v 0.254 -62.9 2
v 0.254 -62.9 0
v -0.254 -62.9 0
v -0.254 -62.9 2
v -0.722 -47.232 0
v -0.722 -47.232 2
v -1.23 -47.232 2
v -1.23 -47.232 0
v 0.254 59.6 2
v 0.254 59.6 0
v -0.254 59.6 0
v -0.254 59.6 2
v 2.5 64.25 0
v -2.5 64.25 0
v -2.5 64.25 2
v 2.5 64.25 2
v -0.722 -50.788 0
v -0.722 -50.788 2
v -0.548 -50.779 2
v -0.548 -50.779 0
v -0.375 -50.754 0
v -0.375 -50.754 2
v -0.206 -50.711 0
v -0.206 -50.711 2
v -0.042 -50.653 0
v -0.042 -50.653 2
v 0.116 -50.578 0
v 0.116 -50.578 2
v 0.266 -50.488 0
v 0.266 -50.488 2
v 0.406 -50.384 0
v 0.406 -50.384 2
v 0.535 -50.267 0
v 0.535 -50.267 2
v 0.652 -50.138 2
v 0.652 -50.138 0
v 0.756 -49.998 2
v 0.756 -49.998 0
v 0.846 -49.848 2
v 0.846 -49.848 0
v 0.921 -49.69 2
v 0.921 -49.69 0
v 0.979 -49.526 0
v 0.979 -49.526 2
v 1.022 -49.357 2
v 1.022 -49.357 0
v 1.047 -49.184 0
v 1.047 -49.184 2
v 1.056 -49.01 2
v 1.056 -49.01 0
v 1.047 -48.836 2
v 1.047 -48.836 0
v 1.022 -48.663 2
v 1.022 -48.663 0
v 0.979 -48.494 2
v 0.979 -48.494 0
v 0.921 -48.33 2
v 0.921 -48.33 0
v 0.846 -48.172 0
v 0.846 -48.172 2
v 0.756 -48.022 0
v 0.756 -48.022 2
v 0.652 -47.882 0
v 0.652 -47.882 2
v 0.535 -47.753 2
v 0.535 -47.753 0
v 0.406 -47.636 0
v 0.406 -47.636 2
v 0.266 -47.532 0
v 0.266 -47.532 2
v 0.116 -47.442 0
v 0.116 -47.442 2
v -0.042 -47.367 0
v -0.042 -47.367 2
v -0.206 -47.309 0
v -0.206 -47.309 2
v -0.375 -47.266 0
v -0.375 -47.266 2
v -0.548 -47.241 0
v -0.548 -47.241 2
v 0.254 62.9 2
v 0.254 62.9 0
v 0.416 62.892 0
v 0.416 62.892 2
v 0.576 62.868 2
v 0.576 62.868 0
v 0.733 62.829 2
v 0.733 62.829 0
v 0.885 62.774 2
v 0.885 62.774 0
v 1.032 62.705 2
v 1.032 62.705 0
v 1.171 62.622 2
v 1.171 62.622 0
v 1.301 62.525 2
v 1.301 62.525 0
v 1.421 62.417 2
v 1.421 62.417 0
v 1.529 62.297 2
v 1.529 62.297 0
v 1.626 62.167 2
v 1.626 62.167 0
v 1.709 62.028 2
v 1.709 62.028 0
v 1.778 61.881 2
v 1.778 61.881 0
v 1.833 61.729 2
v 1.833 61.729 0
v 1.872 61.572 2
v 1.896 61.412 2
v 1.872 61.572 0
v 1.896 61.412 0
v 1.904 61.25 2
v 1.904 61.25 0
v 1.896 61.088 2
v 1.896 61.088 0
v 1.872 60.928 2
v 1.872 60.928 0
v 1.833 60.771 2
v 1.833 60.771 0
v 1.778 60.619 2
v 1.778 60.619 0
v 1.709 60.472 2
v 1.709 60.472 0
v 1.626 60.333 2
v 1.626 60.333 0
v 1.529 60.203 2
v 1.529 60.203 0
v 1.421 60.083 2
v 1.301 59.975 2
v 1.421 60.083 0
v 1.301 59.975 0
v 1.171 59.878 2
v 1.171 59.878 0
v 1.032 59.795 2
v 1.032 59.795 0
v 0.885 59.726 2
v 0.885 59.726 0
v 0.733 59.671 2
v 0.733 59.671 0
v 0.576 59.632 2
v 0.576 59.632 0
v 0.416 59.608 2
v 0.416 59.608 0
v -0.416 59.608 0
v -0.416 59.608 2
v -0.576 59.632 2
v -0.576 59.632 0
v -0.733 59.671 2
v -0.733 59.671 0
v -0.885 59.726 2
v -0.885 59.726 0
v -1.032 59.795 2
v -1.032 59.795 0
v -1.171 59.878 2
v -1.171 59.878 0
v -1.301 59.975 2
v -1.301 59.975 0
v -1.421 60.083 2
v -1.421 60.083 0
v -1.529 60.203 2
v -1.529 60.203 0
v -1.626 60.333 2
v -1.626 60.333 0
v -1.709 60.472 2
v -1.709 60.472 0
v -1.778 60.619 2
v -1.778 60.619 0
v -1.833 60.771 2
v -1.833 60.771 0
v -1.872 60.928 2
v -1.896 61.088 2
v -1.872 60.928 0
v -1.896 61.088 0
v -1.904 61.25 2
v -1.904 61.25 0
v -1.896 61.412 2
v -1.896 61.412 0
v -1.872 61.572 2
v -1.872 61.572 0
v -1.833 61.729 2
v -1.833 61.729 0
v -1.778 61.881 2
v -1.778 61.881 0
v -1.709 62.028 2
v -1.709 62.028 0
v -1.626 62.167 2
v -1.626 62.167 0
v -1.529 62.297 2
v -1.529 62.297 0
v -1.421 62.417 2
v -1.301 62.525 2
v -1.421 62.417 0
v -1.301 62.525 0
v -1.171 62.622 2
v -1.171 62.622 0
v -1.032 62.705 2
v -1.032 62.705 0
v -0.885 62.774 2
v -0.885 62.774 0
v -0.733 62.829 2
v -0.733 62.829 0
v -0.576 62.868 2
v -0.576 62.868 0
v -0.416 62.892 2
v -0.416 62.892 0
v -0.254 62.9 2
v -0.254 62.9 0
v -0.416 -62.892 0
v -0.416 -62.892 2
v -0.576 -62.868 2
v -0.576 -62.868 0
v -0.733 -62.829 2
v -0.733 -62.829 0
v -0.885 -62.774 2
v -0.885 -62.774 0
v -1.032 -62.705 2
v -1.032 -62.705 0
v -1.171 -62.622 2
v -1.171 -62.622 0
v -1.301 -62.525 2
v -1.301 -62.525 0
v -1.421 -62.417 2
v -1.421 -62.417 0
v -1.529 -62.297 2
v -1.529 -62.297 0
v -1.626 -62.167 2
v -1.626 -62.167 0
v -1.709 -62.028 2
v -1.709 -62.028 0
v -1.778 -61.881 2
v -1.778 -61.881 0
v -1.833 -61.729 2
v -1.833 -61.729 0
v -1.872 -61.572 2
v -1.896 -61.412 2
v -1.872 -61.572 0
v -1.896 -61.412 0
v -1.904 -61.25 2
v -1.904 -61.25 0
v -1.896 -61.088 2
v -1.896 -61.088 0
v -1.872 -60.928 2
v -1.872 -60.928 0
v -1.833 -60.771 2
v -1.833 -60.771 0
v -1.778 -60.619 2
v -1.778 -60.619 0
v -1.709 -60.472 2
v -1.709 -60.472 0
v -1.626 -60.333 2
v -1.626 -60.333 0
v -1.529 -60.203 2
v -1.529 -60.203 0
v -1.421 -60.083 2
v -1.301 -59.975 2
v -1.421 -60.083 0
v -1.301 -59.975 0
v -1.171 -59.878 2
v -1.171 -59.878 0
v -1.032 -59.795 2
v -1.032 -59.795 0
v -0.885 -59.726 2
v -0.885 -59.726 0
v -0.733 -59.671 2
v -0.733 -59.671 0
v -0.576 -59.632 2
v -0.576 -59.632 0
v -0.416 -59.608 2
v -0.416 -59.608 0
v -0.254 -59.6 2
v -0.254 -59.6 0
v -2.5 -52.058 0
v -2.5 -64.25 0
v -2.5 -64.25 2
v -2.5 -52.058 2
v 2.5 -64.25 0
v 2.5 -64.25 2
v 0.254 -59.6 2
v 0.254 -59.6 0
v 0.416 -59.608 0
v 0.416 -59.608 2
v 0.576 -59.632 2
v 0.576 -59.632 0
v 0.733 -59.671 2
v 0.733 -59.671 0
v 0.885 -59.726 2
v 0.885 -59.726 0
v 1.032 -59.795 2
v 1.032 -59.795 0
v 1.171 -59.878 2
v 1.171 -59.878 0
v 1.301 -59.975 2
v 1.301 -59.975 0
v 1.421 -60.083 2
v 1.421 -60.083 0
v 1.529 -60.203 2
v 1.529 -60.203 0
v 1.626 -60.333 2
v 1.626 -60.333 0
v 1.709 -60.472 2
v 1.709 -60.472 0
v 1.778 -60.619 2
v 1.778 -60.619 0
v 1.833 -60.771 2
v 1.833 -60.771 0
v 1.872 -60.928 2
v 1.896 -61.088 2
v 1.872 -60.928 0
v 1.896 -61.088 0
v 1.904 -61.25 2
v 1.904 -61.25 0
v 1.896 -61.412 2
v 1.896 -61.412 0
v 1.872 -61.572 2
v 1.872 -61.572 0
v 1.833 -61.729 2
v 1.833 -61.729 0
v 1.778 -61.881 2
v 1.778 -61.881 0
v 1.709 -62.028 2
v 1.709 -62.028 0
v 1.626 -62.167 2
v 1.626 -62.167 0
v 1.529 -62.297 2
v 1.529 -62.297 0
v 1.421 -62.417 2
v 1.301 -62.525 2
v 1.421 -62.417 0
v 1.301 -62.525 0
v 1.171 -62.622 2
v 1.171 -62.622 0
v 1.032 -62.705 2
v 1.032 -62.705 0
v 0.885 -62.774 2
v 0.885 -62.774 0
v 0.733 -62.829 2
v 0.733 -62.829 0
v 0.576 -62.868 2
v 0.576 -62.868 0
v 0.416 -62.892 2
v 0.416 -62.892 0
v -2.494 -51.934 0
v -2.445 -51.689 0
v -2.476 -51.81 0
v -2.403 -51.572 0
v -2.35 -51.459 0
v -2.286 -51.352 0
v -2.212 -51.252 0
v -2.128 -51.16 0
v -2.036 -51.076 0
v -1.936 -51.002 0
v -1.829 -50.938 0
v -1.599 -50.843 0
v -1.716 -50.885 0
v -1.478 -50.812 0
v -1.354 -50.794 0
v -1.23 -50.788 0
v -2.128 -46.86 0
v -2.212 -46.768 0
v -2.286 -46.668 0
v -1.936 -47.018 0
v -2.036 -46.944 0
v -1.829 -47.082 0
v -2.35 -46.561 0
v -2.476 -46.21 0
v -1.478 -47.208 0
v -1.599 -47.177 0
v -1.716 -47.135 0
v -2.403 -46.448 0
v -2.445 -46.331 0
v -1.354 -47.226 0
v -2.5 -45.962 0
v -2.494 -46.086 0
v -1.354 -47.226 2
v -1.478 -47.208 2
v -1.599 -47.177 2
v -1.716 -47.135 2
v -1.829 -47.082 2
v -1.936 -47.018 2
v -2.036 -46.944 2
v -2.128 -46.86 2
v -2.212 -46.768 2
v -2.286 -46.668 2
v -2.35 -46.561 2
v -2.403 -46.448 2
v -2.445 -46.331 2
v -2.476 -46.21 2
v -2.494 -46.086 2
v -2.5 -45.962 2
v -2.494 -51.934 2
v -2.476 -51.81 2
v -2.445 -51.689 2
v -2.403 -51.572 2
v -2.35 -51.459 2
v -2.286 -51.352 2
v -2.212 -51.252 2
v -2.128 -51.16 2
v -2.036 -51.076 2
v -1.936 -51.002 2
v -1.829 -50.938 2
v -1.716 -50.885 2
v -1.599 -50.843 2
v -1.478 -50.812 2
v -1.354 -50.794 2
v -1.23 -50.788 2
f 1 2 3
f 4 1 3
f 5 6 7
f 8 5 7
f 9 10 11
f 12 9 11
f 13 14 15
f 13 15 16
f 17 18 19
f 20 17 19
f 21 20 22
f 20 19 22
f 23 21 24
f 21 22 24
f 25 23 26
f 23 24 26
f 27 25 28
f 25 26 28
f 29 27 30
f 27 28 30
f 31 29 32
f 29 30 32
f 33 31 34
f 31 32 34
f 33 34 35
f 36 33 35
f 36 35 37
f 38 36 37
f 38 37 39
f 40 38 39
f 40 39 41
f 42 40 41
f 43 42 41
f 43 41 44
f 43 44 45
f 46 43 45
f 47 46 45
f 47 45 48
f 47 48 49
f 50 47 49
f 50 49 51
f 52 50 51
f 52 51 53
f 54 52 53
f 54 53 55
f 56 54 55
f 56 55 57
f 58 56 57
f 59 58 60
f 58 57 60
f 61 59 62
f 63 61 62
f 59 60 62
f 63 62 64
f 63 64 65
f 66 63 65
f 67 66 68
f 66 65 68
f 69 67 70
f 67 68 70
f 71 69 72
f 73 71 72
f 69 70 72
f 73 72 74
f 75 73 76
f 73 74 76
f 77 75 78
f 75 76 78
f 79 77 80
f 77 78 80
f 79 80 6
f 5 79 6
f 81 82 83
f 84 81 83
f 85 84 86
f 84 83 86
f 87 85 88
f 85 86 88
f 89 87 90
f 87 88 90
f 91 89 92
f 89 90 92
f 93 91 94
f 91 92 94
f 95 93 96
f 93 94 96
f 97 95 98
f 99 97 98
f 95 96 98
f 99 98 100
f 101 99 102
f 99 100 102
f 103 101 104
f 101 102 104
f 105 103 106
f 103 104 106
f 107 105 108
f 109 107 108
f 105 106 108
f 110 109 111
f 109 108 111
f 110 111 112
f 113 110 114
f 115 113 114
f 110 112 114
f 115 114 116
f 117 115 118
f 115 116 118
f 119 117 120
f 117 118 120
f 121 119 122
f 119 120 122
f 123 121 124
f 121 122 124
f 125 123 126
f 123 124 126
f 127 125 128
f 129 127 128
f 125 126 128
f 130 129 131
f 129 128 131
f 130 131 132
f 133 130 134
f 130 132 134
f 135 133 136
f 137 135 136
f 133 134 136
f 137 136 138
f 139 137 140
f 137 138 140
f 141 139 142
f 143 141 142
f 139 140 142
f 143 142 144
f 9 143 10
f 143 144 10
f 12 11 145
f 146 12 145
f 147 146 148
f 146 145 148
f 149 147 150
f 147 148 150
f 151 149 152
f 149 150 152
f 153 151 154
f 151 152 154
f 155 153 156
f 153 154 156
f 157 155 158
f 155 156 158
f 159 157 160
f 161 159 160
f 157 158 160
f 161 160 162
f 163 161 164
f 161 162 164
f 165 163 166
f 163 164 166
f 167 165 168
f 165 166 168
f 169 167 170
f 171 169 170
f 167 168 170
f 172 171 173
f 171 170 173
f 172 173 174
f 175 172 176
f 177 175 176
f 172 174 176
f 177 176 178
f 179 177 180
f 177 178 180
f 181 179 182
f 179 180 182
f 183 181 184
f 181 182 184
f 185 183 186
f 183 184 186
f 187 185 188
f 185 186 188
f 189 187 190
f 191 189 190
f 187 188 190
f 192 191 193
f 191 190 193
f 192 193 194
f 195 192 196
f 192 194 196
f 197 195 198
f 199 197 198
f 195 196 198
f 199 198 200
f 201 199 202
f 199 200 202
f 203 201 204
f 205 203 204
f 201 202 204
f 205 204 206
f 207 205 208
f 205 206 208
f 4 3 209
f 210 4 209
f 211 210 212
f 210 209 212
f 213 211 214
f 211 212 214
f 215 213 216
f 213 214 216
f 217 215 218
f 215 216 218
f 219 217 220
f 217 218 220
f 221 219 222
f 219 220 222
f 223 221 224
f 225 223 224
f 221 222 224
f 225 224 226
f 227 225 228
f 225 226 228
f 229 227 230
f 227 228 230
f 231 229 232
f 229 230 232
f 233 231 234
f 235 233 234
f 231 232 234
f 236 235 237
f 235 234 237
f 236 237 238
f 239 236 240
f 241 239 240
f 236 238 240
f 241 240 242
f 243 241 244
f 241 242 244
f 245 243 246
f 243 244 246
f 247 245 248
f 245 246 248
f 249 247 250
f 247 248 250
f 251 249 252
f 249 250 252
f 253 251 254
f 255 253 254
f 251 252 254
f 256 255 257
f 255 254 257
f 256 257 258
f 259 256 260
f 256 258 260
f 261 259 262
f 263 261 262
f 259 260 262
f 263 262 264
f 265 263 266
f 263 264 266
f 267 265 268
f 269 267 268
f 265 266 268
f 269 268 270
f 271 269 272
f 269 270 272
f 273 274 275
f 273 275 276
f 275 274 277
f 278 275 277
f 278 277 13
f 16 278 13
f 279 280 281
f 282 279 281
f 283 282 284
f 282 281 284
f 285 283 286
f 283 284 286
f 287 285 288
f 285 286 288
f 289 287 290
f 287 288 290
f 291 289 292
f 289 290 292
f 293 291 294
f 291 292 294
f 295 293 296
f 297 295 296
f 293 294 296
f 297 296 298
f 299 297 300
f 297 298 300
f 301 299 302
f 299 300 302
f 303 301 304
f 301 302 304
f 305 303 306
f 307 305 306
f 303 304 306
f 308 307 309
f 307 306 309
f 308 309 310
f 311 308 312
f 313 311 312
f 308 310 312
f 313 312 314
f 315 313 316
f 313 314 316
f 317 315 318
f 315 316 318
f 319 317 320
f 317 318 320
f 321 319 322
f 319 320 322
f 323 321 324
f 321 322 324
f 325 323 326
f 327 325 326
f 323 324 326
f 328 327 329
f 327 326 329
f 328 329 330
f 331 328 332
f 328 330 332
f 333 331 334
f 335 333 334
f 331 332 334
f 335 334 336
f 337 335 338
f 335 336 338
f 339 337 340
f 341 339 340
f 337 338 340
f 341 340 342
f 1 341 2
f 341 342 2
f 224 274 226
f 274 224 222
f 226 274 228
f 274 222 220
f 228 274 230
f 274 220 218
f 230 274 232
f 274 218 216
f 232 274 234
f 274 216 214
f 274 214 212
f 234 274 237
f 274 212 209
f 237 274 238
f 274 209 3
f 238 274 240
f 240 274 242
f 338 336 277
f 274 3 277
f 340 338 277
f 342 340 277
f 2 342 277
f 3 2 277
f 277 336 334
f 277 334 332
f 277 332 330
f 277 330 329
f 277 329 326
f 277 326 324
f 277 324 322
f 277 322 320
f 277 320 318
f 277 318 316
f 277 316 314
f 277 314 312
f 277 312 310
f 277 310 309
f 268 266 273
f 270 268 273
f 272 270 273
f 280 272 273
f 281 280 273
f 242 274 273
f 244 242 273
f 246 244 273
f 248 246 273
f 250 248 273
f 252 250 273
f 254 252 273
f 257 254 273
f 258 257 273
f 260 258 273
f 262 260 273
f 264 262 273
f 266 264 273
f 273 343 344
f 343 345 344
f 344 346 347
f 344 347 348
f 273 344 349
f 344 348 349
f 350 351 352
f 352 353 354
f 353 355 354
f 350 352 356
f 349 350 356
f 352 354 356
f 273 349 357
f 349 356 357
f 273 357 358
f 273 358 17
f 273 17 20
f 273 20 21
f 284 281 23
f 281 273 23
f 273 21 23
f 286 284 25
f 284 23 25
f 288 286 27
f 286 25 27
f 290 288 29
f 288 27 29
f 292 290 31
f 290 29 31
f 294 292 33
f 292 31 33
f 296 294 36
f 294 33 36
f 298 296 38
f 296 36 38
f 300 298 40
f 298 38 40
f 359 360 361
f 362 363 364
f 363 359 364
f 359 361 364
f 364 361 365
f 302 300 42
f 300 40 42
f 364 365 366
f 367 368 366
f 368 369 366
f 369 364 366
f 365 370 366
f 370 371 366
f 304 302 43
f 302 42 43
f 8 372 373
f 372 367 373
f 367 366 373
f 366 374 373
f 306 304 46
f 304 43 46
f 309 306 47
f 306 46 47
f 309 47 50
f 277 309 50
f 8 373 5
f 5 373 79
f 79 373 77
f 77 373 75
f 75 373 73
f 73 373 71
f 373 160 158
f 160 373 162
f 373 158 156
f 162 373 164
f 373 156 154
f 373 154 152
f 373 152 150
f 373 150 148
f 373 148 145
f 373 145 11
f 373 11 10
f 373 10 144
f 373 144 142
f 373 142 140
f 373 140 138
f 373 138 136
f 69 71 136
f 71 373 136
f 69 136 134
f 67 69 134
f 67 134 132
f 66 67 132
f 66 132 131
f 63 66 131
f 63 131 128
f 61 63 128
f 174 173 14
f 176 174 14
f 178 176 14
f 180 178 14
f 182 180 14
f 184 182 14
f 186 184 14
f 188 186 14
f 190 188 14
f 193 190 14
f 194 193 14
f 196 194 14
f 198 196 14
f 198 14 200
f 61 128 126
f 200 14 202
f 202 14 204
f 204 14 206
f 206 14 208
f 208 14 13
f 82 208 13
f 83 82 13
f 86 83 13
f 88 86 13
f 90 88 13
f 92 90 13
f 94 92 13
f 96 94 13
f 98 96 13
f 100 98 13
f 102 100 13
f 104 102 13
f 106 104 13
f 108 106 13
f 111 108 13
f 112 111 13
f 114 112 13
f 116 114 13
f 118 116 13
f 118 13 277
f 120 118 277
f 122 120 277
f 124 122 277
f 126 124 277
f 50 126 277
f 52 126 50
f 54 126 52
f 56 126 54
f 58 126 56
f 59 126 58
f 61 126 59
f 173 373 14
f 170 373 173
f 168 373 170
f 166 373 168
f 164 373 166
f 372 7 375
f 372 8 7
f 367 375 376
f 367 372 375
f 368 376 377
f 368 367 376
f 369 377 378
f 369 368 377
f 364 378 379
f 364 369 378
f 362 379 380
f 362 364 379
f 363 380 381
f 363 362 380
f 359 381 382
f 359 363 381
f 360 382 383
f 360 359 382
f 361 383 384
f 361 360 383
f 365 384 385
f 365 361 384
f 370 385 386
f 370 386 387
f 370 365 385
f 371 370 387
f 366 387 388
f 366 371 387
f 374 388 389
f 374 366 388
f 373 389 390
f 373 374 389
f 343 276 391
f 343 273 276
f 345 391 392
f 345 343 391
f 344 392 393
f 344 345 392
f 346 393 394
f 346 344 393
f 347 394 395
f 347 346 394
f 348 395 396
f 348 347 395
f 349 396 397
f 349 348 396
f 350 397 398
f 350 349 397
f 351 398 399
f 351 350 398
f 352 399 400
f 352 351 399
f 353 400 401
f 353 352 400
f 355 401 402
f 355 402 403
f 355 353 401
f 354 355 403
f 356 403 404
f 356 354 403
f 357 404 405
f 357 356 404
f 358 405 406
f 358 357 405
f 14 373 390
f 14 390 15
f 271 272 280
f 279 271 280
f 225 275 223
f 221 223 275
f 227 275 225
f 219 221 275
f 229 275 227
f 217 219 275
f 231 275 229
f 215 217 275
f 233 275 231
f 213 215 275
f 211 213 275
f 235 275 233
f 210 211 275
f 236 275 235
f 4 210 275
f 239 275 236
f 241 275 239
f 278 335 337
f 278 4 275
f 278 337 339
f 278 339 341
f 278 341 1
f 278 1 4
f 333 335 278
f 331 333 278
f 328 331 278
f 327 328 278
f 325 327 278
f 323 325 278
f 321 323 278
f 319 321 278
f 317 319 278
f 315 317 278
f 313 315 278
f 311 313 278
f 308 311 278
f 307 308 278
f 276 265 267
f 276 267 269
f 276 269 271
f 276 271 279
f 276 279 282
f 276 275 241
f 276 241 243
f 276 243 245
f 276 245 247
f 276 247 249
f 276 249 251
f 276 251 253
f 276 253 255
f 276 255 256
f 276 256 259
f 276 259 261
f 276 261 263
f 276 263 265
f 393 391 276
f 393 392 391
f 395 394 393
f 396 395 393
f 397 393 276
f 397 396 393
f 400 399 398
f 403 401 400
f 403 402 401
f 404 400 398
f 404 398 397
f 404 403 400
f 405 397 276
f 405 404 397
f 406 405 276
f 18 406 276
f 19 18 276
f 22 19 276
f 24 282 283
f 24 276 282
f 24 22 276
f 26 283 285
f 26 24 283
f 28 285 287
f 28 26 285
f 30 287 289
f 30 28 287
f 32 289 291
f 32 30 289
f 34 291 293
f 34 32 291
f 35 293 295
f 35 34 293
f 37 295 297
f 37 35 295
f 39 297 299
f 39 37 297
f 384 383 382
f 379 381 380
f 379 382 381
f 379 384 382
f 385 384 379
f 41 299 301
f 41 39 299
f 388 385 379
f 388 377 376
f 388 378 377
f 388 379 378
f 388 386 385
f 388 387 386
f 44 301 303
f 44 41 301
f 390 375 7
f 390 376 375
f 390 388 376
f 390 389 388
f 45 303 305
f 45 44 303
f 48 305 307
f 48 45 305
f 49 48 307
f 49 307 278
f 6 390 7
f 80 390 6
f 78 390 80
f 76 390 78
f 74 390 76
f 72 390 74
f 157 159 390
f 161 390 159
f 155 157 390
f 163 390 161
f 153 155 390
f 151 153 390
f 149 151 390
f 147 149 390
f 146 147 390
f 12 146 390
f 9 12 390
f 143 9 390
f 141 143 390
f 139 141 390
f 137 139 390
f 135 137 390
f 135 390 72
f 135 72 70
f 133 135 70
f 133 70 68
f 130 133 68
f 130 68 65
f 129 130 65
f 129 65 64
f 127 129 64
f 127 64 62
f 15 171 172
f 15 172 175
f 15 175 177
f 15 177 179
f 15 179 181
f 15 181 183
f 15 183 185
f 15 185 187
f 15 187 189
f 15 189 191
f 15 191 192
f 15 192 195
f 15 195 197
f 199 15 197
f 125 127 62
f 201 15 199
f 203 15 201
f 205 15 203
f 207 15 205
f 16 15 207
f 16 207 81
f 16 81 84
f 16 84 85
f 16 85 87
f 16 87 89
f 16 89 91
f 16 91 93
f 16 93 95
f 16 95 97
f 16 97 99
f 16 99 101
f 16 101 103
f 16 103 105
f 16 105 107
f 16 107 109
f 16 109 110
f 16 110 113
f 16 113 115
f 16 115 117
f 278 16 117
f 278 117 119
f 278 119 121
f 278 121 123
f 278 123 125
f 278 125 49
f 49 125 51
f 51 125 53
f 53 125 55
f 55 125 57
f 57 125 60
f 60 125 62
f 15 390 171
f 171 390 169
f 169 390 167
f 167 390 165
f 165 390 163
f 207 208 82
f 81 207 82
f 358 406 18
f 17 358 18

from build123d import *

# Parameters (mm, degrees)
SKETCH1_W           = 5
SKETCH1_H           = 128.5
BOSS_EXTRUDE1_DEPTH = 2
CUT_EXTRUDE1_DEPTH  = 2.54
FILLET1_R           = 1.27


with BuildPart() as part:
    # Sketch1 → Boss-Extrude1 (new body)
    with BuildSketch(Plane.XY):
        Rectangle(SKETCH1_W, SKETCH1_H)
        with BuildLine():
            Line((-0.254, -59.6), (0.254, -59.6))
            ThreePointArc((0.254, -59.6), (1.904, -61.25), (0.254, -62.9))
            Line((0.254, -62.9), (-0.254, -62.9))
            ThreePointArc((-0.254, -62.9), (-1.904, -61.25), (-0.254, -59.6))
        make_face(mode=Mode.SUBTRACT)
        with BuildLine():
            Line((-0.254, 62.9), (0.254, 62.9))
            ThreePointArc((0.254, 62.9), (1.904, 61.25), (0.254, 59.6))
            Line((0.254, 59.6), (-0.254, 59.6))
            ThreePointArc((-0.254, 59.6), (-1.904, 61.25), (-0.254, 62.9))
        make_face(mode=Mode.SUBTRACT)
    extrude(amount=BOSS_EXTRUDE1_DEPTH)

    # Sketch2 → Cut-Extrude1 (cut)
    with BuildSketch(Plane.XY.offset(2)):
        with BuildLine():
            Line((-0.722, -47.232), (-2.5, -47.232))
            Line((-2.5, -47.232), (-2.5, -50.788))
            Line((-2.5, -50.788), (-0.722, -50.788))
            ThreePointArc((-0.722, -50.788), (1.056, -49.01), (-0.722, -47.232))
        make_face()
    extrude(amount=-CUT_EXTRUDE1_DEPTH, mode=Mode.SUBTRACT)

    # Fillet1
    fillet1_edges = [part.edges().sort_by_distance(p)[0] for p in [
        (-2.5, -47.232, 1),
        (-2.5, -50.788, 1),
    ]]
    fillet(fillet1_edges, radius=FILLET1_R)


solid = part.part
